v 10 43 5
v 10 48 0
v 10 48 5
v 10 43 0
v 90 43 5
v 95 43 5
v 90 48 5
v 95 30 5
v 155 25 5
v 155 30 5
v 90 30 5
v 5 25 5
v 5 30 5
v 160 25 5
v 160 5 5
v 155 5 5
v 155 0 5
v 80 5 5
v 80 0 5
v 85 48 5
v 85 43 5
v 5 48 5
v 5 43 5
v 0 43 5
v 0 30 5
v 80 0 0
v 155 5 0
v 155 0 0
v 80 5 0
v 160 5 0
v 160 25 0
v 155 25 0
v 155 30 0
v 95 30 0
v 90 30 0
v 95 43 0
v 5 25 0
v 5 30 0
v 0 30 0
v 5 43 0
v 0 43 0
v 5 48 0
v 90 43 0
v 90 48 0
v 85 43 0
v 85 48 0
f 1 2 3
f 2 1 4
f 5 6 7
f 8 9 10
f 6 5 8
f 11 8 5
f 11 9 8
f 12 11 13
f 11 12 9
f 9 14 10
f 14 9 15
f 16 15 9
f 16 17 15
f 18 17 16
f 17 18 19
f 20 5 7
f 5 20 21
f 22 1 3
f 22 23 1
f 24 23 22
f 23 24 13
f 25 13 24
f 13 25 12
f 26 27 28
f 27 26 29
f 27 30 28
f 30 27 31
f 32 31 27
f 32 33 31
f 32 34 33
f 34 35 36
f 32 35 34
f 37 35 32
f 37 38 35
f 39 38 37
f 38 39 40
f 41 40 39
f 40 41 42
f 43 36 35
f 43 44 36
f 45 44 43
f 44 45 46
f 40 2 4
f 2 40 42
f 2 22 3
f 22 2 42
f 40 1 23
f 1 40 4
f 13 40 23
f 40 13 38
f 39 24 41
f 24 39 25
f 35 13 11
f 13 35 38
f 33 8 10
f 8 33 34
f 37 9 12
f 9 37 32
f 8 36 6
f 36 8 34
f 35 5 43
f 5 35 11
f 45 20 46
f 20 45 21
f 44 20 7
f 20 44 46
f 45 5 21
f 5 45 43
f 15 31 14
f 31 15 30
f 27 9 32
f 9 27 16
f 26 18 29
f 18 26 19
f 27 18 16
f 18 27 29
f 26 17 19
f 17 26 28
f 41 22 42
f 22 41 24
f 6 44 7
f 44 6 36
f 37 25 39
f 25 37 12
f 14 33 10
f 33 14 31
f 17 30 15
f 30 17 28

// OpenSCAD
// Device Width
device_width = 85; // [1:200]
// Device Thickness
device_thickness = 13; // [1:50]
// Visor Thickness
visor_thickness = 20; // [1:50]
// Visor Height
visor_height = 150; // [1:300]
// Thickness
thickness = 5; // [1:10]

// device holder
translate([thickness, thickness+device_thickness+visor_thickness+thickness, 0])
	cube([thickness, thickness, thickness]);
translate([0, thickness+visor_thickness+thickness, 0])
	cube([thickness, device_thickness, thickness]);
translate([thickness, visor_thickness+thickness, 0])
	cube([device_width, thickness, thickness]);
translate([thickness+device_width, thickness+visor_thickness+thickness, 0])
	cube([thickness, device_thickness, thickness]);
translate([device_width, thickness+device_thickness+visor_thickness+thickness, 0])
	cube([thickness, thickness, thickness]);

// visor clip
translate([thickness, visor_thickness+thickness, 0])
	cube([visor_height, thickness, thickness]);
translate([thickness+visor_height, thickness, 0])
	cube([thickness, visor_thickness, thickness]);
translate([thickness+(visor_height/2), 0, 0])
	cube([visor_height/2, thickness, thickness]);

linear_extrude(thickness) {	
	polygon(points=[
		[0,         thickness+visor_thickness+thickness], 
		[thickness, thickness+visor_thickness+thickness], 
		[thickness, thickness+visor_thickness]], paths=[[0, 1, 2]]);
	polygon(points=[
		[0,         thickness+visor_thickness+thickness+device_thickness], 
		[thickness, thickness+visor_thickness+thickness+device_thickness+thickness], 
		[thickness, thickness+visor_thickness+thickness+device_thickness]], paths=[[0, 1, 2]]);
	polygon(points=[
		[thickness+visor_height,           0], 
		[thickness+visor_height,           thickness], 
		[thickness+visor_height+thickness, thickness]], paths=[[0, 1, 2]]);
	polygon(points=[
		[thickness+visor_height,           thickness+visor_thickness], 
		[thickness+visor_height,           thickness+visor_thickness+thickness], 
		[thickness+visor_height+thickness, thickness+visor_thickness]], paths=[[0, 1, 2]]);
	polygon(points=[
		[thickness+device_width,           thickness+visor_thickness], 
		[thickness+device_width,           thickness+visor_thickness+thickness], 
		[thickness+device_width+thickness, thickness+visor_thickness+thickness]], paths=[[0, 1, 2]]);
	polygon(points=[
		[thickness+device_width,           thickness+visor_thickness+thickness+device_thickness], 
		[thickness+device_width,           thickness+visor_thickness+thickness+device_thickness+thickness], 
		[thickness+device_width+thickness, thickness+visor_thickness+thickness+device_thickness]], paths=[[0, 1, 2]]);
}
